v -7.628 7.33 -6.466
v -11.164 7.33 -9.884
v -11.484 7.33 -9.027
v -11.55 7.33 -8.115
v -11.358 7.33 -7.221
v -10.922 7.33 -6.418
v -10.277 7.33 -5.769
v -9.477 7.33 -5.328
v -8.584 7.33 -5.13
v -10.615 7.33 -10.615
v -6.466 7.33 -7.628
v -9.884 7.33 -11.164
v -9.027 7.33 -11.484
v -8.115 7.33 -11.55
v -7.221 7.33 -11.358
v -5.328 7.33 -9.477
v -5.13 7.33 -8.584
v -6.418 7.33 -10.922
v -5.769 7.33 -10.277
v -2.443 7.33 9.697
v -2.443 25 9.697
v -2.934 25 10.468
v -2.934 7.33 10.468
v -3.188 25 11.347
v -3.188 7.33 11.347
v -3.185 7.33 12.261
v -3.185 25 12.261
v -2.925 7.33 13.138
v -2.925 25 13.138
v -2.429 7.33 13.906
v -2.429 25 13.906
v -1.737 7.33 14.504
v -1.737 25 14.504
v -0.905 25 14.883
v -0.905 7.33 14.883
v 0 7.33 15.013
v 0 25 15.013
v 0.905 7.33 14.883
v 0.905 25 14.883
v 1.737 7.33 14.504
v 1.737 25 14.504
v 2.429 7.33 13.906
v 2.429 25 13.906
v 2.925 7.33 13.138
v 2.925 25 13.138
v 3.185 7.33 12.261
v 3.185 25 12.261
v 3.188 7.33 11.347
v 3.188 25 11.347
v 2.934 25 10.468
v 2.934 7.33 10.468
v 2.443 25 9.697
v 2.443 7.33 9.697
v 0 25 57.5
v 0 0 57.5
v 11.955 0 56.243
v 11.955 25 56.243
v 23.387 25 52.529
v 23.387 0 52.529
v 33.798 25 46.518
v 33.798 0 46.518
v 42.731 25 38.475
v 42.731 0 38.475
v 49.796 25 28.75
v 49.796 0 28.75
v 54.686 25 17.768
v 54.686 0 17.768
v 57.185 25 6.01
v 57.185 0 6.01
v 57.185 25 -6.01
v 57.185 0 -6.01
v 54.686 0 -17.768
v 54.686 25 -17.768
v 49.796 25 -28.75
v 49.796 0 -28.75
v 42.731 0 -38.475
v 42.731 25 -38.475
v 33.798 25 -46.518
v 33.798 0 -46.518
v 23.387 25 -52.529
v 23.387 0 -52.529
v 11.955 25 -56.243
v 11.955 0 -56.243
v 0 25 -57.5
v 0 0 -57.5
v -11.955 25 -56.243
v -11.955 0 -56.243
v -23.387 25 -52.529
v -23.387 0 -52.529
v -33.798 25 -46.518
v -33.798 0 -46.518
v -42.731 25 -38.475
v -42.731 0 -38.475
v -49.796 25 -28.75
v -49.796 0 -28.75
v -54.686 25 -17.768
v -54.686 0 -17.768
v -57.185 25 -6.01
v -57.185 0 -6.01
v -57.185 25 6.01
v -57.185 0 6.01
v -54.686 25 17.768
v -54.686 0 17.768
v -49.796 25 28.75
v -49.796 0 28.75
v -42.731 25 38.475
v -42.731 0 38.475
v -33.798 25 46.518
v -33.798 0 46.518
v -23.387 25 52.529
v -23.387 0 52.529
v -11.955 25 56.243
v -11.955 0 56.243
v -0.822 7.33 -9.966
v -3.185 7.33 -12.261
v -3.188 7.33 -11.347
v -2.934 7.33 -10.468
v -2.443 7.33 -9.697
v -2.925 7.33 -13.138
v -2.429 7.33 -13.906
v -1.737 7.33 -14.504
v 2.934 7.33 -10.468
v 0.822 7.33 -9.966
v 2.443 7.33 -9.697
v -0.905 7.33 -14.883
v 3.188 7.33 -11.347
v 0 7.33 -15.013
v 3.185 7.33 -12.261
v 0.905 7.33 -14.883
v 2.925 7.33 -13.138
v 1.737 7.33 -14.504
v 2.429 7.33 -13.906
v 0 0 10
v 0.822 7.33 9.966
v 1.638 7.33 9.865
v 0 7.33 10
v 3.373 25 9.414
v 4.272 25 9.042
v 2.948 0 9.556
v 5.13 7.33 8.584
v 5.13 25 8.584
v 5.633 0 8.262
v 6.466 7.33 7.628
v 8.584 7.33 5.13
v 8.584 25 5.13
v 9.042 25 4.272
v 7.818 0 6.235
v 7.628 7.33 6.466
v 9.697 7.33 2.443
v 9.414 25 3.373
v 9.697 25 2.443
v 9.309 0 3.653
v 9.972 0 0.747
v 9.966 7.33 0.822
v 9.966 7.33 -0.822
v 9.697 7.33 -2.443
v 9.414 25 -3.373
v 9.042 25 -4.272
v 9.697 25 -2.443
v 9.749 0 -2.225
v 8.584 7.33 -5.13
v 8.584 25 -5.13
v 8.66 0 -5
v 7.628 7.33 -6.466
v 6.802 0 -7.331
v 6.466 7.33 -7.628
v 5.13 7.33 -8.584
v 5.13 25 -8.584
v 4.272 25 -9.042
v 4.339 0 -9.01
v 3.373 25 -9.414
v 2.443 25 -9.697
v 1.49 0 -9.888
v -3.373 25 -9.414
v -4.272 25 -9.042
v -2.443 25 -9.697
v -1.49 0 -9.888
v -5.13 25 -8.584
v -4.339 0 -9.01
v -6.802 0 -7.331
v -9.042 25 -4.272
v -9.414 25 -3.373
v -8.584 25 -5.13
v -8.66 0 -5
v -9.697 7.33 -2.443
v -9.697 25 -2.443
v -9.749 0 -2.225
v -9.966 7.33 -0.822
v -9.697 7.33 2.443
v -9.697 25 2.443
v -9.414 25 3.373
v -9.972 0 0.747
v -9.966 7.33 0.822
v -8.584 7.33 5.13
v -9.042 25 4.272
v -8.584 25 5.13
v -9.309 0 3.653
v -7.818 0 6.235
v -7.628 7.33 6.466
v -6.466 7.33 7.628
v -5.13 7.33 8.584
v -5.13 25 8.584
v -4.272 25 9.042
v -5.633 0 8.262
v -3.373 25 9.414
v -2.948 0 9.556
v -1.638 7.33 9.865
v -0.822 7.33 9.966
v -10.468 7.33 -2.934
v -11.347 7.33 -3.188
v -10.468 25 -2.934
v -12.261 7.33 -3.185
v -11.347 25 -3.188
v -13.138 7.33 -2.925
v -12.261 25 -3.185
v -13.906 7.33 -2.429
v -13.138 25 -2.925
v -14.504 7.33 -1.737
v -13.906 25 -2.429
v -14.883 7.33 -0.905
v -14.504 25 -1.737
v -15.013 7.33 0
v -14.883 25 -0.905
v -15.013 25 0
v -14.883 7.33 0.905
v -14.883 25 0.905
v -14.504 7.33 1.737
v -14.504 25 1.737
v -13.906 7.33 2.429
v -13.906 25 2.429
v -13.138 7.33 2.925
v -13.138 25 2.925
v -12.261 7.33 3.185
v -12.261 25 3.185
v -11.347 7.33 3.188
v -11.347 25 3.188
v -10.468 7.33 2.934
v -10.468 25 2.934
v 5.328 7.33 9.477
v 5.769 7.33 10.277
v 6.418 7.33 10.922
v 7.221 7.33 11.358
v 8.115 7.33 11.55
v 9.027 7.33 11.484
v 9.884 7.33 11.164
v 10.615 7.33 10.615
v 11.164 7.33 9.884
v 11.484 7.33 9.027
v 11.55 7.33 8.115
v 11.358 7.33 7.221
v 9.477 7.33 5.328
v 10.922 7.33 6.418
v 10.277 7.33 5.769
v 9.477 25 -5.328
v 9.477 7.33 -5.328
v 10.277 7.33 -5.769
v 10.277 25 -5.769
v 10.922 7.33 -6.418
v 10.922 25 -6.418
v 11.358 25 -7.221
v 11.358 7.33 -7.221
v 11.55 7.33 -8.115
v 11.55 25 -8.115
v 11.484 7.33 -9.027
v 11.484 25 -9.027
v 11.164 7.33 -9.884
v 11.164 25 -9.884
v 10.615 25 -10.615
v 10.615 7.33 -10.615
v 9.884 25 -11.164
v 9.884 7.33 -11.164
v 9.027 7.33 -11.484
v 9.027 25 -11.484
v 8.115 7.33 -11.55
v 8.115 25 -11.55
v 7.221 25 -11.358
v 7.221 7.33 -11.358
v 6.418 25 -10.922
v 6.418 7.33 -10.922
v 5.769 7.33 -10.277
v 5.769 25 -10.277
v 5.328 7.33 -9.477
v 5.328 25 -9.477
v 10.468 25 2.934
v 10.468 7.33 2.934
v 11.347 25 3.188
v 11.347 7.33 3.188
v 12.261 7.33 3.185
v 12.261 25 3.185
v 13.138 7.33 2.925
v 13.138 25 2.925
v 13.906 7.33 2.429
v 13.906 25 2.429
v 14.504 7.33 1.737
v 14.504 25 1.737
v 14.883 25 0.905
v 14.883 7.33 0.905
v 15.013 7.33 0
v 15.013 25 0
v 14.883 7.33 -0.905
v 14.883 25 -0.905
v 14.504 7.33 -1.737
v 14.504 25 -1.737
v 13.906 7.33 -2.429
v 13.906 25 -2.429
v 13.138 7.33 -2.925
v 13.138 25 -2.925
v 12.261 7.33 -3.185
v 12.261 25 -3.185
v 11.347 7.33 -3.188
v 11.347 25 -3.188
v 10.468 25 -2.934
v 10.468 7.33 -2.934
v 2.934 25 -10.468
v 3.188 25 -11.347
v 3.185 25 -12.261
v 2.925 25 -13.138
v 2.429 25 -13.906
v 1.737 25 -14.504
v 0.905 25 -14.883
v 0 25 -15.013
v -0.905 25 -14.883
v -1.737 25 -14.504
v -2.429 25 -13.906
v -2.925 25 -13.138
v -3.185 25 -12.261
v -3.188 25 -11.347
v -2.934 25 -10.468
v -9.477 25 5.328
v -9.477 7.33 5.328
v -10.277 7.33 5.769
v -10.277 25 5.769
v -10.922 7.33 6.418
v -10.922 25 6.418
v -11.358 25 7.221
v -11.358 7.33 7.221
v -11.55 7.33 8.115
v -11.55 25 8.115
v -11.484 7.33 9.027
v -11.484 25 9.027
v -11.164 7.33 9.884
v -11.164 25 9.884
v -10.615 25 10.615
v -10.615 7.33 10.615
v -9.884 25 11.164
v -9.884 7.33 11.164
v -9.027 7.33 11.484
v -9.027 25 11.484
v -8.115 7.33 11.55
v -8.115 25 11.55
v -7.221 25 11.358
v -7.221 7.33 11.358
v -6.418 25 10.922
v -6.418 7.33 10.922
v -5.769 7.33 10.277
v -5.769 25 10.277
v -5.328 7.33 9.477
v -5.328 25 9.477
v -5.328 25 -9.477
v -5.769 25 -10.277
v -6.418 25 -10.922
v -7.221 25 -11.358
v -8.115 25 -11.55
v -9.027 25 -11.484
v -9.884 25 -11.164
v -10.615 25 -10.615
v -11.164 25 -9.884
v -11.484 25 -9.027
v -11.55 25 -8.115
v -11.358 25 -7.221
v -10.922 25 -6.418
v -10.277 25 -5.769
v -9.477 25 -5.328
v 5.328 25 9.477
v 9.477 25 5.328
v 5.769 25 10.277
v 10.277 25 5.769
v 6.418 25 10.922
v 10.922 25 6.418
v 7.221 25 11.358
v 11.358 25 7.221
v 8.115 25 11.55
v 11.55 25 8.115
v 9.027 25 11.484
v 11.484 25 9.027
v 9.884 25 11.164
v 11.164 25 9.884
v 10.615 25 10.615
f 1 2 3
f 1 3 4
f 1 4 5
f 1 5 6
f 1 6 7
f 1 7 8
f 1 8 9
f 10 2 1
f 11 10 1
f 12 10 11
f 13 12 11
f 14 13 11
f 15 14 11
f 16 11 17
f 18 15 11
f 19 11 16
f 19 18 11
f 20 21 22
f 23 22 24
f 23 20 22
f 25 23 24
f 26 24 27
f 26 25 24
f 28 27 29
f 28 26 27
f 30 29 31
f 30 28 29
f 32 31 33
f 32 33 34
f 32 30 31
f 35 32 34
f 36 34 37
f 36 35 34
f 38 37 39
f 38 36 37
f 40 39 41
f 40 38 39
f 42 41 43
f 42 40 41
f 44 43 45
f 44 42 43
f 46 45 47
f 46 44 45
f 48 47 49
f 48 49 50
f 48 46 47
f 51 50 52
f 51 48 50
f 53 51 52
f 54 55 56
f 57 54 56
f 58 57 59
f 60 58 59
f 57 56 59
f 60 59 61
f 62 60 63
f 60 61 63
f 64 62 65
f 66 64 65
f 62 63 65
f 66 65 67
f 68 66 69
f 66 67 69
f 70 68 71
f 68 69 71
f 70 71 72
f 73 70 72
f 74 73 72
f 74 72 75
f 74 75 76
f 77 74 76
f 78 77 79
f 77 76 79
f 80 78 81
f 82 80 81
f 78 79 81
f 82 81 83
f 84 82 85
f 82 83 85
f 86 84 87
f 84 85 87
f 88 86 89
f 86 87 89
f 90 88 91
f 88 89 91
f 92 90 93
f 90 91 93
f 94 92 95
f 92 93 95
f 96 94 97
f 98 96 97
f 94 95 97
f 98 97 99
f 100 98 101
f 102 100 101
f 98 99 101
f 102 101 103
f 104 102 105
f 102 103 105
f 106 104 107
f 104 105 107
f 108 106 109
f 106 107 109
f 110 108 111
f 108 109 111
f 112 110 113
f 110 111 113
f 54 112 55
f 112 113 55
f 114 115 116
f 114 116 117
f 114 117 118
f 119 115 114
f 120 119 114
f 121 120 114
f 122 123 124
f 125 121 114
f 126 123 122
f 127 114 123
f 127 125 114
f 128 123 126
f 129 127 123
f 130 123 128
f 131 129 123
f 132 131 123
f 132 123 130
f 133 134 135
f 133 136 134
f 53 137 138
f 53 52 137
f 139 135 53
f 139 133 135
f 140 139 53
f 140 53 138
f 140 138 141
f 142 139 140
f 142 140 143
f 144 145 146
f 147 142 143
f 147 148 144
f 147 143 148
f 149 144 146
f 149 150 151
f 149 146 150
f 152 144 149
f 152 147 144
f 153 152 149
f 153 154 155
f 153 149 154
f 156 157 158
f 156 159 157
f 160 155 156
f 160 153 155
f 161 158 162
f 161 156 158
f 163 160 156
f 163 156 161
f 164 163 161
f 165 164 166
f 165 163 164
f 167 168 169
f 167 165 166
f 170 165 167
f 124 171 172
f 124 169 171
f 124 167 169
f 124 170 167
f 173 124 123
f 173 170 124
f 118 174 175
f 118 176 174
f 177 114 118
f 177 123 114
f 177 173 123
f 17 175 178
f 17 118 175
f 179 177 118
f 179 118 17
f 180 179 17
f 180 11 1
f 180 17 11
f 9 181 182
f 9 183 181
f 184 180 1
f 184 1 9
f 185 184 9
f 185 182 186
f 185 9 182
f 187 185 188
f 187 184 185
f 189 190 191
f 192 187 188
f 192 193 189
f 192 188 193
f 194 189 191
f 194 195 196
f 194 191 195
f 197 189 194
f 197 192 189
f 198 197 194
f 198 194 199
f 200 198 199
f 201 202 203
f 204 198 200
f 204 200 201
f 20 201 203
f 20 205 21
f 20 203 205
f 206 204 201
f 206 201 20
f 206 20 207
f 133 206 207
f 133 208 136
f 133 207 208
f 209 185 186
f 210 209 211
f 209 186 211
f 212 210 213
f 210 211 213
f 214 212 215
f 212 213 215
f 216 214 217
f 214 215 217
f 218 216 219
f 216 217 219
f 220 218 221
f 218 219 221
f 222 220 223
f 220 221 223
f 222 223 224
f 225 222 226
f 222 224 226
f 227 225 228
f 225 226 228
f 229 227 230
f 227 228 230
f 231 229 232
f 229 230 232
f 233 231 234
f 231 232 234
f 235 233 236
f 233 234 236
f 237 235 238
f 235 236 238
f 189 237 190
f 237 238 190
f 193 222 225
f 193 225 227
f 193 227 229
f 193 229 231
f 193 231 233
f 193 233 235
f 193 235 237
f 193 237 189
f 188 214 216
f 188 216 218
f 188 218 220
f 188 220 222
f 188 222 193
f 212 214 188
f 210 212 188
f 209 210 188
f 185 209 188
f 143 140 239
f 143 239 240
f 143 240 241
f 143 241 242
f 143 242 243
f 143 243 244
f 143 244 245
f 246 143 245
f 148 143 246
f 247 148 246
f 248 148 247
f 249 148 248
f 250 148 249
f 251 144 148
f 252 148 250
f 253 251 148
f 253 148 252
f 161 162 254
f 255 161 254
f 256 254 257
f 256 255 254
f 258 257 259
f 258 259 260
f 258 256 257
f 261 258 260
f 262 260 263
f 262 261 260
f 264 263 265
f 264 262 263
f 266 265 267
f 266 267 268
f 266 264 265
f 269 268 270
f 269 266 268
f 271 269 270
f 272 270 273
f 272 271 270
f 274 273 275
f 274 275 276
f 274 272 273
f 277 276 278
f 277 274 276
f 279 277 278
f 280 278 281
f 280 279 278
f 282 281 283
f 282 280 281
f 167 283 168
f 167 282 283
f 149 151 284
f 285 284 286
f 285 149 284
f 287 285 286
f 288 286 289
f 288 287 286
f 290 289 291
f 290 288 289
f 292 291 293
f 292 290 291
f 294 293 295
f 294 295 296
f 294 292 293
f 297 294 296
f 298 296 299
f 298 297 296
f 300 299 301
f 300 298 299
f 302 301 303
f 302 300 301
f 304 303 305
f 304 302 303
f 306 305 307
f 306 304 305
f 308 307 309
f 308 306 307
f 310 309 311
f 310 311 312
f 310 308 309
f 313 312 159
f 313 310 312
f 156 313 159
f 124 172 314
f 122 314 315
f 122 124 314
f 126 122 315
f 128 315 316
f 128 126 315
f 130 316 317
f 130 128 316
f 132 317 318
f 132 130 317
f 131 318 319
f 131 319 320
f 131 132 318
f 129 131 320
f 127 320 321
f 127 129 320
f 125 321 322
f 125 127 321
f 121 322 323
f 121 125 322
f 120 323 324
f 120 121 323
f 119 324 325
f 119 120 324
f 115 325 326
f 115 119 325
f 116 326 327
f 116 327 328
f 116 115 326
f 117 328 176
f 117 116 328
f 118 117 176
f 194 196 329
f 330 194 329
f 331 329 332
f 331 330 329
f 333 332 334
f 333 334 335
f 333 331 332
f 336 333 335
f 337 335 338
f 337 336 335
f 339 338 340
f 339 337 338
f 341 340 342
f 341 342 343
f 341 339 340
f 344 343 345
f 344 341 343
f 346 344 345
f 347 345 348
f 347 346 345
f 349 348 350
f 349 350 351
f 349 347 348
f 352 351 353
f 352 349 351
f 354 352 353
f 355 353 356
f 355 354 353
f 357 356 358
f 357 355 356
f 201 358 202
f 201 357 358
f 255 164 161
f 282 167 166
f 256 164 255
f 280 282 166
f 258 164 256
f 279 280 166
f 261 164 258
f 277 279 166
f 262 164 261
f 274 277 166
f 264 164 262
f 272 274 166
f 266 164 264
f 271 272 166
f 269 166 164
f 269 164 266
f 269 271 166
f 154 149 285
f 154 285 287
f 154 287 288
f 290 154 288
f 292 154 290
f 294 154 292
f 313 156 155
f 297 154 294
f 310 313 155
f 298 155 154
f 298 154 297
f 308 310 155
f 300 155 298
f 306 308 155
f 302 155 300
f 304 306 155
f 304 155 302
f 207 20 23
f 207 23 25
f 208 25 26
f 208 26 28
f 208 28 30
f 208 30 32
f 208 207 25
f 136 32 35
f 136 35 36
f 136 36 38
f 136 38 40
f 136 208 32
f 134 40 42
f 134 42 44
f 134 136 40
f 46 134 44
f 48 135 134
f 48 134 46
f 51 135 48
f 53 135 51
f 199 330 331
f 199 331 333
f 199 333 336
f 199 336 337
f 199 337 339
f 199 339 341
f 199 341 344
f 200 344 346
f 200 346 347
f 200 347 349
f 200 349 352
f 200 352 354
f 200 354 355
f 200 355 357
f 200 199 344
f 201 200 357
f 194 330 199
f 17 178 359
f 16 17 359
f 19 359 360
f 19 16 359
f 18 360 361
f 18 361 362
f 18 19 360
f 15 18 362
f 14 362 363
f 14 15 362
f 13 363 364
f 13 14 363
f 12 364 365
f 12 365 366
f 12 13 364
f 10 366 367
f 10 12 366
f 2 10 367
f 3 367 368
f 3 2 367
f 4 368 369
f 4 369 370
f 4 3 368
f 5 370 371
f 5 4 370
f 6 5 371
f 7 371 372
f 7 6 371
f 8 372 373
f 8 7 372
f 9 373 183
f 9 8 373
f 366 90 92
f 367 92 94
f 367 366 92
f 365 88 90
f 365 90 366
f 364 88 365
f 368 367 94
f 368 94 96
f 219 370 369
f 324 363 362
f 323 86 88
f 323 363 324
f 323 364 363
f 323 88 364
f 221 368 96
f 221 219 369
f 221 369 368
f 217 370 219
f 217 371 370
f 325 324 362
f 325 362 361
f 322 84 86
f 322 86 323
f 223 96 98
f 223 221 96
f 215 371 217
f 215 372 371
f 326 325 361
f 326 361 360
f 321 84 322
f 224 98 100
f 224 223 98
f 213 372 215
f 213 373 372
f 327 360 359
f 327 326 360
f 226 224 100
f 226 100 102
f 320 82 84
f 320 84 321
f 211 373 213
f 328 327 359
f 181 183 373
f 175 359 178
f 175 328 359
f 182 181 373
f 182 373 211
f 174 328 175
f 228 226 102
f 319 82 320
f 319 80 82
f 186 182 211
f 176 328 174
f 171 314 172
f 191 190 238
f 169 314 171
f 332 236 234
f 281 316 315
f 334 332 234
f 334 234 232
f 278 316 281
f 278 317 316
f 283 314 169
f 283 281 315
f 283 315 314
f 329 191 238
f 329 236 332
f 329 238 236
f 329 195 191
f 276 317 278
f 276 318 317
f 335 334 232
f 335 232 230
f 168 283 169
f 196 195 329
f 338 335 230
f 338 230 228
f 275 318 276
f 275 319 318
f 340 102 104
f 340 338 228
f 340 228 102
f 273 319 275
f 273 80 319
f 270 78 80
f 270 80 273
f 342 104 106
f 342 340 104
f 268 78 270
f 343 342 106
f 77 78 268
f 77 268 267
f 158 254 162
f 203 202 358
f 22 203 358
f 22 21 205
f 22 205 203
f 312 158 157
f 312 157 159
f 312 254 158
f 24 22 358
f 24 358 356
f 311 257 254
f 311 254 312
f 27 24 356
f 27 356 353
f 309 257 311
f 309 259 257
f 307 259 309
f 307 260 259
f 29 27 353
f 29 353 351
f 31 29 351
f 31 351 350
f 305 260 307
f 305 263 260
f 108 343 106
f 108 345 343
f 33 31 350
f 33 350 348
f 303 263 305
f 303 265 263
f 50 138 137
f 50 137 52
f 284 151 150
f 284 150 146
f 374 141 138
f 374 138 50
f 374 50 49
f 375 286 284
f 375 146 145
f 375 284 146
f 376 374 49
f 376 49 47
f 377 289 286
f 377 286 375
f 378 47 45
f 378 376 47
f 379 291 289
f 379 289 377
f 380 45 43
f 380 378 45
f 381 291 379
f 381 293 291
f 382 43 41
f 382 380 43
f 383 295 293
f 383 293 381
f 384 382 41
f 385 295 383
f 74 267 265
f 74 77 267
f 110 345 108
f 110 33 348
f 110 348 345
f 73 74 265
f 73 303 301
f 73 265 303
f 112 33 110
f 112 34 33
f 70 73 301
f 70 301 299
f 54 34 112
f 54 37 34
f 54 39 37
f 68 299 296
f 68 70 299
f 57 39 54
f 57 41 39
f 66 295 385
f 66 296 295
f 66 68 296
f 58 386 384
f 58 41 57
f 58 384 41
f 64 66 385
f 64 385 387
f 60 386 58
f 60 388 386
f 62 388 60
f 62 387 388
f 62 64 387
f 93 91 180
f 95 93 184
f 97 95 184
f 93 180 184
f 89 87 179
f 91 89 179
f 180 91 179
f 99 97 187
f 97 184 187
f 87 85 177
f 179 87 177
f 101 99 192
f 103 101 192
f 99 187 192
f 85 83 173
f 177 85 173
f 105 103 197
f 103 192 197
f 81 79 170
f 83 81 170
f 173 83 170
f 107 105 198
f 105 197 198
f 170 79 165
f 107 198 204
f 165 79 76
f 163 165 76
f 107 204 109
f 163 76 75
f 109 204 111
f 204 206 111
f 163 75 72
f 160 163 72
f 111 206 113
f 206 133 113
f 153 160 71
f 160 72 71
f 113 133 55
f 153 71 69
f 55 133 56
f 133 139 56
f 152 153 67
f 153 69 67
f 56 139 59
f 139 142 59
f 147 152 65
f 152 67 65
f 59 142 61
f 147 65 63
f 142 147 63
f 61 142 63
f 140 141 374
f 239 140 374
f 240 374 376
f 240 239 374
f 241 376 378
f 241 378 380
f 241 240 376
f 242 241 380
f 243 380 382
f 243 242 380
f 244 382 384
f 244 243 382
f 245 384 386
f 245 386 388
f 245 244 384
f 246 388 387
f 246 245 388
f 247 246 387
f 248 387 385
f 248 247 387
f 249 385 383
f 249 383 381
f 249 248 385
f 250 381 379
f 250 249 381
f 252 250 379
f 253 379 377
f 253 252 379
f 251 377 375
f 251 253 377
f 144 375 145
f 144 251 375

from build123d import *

# Parameters (mm, degrees)
SKETCH1_R           = 57.5
BOSS_EXTRUDE1_DEPTH = 25
SKETCH2_R           = 10
CUT_EXTRUDE1_DEPTH  = 86.073497636
SKETCH3_R           = 3.219002266
CUT_EXTRUDE2_DEPTH  = 17.669629676
CIRPATTERN1_COUNT   = 8


with BuildPart() as part:
    # Sketch1 → Boss-Extrude1 (new body)
    with BuildSketch(Plane(origin=(0, 0, 0), x_dir=(1, 0, 0), z_dir=(0, 1, 0))):
        Circle(SKETCH1_R)
    extrude(amount=BOSS_EXTRUDE1_DEPTH)

    # Sketch2 → Cut-Extrude1 (cut, through all)
    with BuildSketch(Plane(origin=(0, 0, 0), x_dir=(1, 0, 0), z_dir=(0, 1, 0))):
        Circle(SKETCH2_R)
    extrude(amount=CUT_EXTRUDE1_DEPTH, mode=Mode.SUBTRACT)

    # Sketch3 → Cut-Extrude2 (cut)
    with BuildSketch(Plane(origin=(0, 25, 0), x_dir=(1, 0, 0), z_dir=(0, 1, 0))):
        with Locations((-11.793512299, 0)):
            Circle(SKETCH3_R)
    cut_extrude2 = extrude(amount=-CUT_EXTRUDE2_DEPTH, mode=Mode.SUBTRACT)

    # CirPattern1: Cut-Extrude2 ×8 about axis
    cirpattern1_axis = Axis((0, 0, 0), (0, 1, 0))
    for i in range(1, CIRPATTERN1_COUNT):
        add(cut_extrude2.rotate(cirpattern1_axis, i * 360 / CIRPATTERN1_COUNT), mode=Mode.SUBTRACT)


solid = part.part
